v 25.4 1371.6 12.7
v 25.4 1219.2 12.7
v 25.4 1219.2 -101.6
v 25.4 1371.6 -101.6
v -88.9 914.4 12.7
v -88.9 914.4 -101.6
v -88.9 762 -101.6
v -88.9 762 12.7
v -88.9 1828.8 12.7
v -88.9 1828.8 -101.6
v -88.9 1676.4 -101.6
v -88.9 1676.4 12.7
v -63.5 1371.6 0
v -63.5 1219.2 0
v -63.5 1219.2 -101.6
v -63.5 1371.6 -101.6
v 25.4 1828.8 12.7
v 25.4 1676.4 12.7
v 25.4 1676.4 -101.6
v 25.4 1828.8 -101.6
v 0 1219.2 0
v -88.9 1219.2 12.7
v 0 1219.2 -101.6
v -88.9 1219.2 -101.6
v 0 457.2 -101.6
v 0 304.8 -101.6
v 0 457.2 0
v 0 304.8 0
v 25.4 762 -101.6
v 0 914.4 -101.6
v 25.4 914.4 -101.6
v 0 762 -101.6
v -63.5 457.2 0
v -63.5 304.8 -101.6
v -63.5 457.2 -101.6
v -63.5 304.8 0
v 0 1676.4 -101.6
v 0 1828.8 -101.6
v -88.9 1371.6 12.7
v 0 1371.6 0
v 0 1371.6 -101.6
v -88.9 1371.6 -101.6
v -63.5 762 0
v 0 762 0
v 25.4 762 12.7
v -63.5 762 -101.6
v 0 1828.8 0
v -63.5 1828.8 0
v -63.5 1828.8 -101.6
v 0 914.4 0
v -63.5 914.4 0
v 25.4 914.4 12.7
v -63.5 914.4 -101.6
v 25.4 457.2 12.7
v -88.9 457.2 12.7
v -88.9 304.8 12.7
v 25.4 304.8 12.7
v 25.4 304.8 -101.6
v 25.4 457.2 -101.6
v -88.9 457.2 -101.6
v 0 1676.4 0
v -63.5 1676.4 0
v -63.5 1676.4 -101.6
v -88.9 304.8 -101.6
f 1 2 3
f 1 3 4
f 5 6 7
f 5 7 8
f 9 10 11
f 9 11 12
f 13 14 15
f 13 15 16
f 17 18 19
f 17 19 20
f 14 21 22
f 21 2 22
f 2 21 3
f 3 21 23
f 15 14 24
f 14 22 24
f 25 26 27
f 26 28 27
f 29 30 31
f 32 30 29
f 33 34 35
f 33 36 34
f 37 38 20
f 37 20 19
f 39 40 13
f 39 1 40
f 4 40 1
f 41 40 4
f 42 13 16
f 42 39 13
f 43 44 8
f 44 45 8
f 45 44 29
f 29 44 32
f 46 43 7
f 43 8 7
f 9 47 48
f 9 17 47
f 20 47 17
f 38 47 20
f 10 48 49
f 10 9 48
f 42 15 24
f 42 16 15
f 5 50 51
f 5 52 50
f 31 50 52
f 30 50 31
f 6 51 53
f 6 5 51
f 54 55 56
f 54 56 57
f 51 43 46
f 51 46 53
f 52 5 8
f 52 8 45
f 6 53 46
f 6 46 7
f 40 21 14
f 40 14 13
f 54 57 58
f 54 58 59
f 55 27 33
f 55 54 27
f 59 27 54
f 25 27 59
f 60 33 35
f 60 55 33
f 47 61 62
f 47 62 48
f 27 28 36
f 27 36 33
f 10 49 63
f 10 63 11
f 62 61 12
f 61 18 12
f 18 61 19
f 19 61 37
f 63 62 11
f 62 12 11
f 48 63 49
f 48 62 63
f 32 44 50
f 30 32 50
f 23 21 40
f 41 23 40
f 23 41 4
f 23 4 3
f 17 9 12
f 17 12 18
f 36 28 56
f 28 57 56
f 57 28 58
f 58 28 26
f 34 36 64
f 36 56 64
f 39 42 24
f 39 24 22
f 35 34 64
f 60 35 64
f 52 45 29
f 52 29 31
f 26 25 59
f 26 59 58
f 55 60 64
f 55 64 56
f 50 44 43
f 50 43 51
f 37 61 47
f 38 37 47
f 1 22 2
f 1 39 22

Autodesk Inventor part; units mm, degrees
sketch "Sketch2" plane through (0, 0, 0) normal (1, 0, 0) x (0, 1, 0)
  line L0 (0, 0) -> (0, -1828.8)
  line L1 (0, 0) -> (2133.6, 0)
  line L2 (2133.6, 0) -> (0, -1828.8)
  line L3 (0, 0) -> (152.4, 0)
  line L4 (152.4, 0) -> (685.8, 0)
  line L5 (2133.6, 0) -> (1981.2, 0)
  line L6 (1981.2, 0) -> (1854.2, 0)
  line L7 (1854.2, 0) -> (1549.4, 0)
  line L8 (1549.4, 0) -> (1422.4, 0)
  line L9 (1422.4, 0) -> (1117.6, 0)
  line L10 (1117.6, 0) -> (990.6, 0)
  line L11 (990.6, 0) -> (685.8, 0)
  line L12 (685.8, 0) -> (558.8, 0)
  line L13 (558.8, 0) -> (254, 0)
  line L14 (0, 0) -> (304.8, 0)
  line L15 (304.8, 0) -> (457.2, 0)
  line L16 (457.2, 0) -> (762, 0)
  line L17 (762, 0) -> (914.4, 0)
  line L18 (914.4, 0) -> (1219.2, 0)
  line L19 (1219.2, 0) -> (1371.6, 0)
  line L20 (1371.6, 0) -> (1676.4, 0)
  line L21 (1676.4, 0) -> (1828.8, 0)
  line L22 (304.8, 0) -> (304.8, -101.6)
  line L23 (457.2, 0) -> (457.2, -101.6)
  line L24 (762, 0) -> (762, -101.6)
  line L25 (914.4, 0) -> (914.4, -101.6)
  line L26 (1219.2, 0) -> (1219.2, -101.6)
  line L27 (1371.6, 0) -> (1371.6, -101.6)
  line L28 (1676.4, 0) -> (1676.4, -101.6)
  line L29 (1828.8, 0) -> (1828.8, -101.6)
  line L30 (1828.8, -101.6) -> (1676.4, -101.6)
  line L31 (1371.6, -101.6) -> (1219.2, -101.6)
  line L32 (914.4, -101.6) -> (762, -101.6)
  line L33 (457.2, -101.6) -> (304.8, -101.6)
  point P0 (304.8, -1567.5429)
  point P1 (457.2, -1436.9143)
  point P2 (762, -1175.6571)
  point P3 (914.4, -1045.0286)
  point P4 (1219.2, -783.7714)
  point P5 (1371.6, -653.1429)
  point P6 (1676.4, -391.8857)
  point P7 (1828.8, -261.2571)
  dimension "d1" = 1828.8
  dimension "d3" = 152.4
  dimension "d5" = 152.4
  dimension "d14" = 304.8
  dimension "d15" = 152.4
  dimension "d16" = 304.8
  dimension "d17" = 152.4
  dimension "d18" = 304.8
  dimension "d19" = 152.4
  dimension "d20" = 304.8
  dimension "d21" = 152.4
  dimension "d24" = 2133.6
  dimension "d27" = 101.6
  dimension "d28" = 101.6
  dimension "d29" = 101.6
extrude "Extrusion1" add sketch "Sketch2" along normal blind 25.4 contours L1 L23 L33 L22 | L29 L30 L28 L1 | L1 L25 L32 L24 | L27 L31 L26 L1
ref_plane "Work Plane3" through (12.7, 914.4, 0) normal (0, 0, 1) x (1, 0, 0)
sketch "Sketch5" plane through (0, 762, 0) normal (0, 0, 1) x (1, 0, 0)
  line L0 (25.4, -304.8) -> (25.4, -457.2) projected
  line L1 (0, -304.8) -> (25.4, -304.8) projected
  line L2 (25.4, -457.2) -> (0, -457.2)
  line L3 (0, -457.2) -> (0, -304.8)
  line L4 (0, -304.8) -> (25.4, -304.8)
  line L5 (25.4, -304.8) -> (25.4, -457.2)
  line L6 (25.4, 152.4) -> (25.4, 0) projected
  line L7 (0, 152.4) -> (25.4, 152.4) projected
  line L8 (25.4, 0) -> (0, 0)
  line L9 (0, 0) -> (0, 152.4)
  line L10 (0, 152.4) -> (25.4, 152.4)
  line L11 (25.4, 152.4) -> (25.4, 0)
  line L12 (25.4, 609.6) -> (25.4, 457.2) projected
  line L13 (0, 609.6) -> (0, 457.2) projected
  line L14 (25.4, 457.2) -> (0, 457.2)
  line L15 (0, 457.2) -> (0, 609.6)
  line L16 (0, 609.6) -> (25.4, 609.6)
  line L17 (25.4, 609.6) -> (25.4, 457.2)
  line L18 (25.4, 1066.8) -> (25.4, 914.4) projected
  line L19 (0, 1066.8) -> (0, 914.4) projected
  line L20 (25.4, 914.4) -> (0, 914.4)
  line L21 (0, 914.4) -> (0, 1066.8)
  line L22 (0, 1066.8) -> (25.4, 1066.8)
  line L23 (25.4, 1066.8) -> (25.4, 914.4)
  point P0 (0, -762)
extrude "Extrusion3" add sketch "Sketch5" along normal blind 12.7
ref_plane "Work Plane5" through (0, 0, 0) normal (-1, 0, 0) x (0, 0, 1)
ref_plane "Work Plane4" through (12.7, 0, 0) normal (-1, 0, 0) x (0, 0, 1)
sketch "Sketch6" plane through (0, 0, 0) normal (-1, 0, 0) x (0, 0, 1)
  line L0 (-101.6, 304.8) -> (12.7, 304.8) projected
  line L1 (-101.6, 457.2) -> (12.7, 457.2) projected
  line L2 (12.7, 304.8) -> (0, 304.8)
  line L3 (0, 304.8) -> (0, 457.2)
  line L4 (0, 457.2) -> (12.7, 457.2)
  line L5 (12.7, 457.2) -> (12.7, 304.8)
  line L6 (-101.6, 762) -> (12.7, 762) projected
  line L7 (-101.6, 914.4) -> (12.7, 914.4) projected
  line L8 (12.7, 762) -> (0, 762)
  line L9 (0, 762) -> (0, 914.4)
  line L10 (0, 914.4) -> (12.7, 914.4)
  line L11 (12.7, 914.4) -> (12.7, 762)
  line L12 (12.7, 1371.6) -> (12.7, 1219.2) projected
  line L13 (12.7, 1219.2) -> (0, 1219.2)
  line L14 (0, 1219.2) -> (0, 1371.6)
  line L15 (0, 1371.6) -> (12.7, 1371.6)
  line L16 (12.7, 1371.6) -> (12.7, 1219.2)
  line L17 (-101.6, 1676.4) -> (12.7, 1676.4) projected
  line L18 (-101.6, 1828.8) -> (12.7, 1828.8) projected
  line L19 (12.7, 1676.4) -> (0, 1676.4)
  line L20 (0, 1676.4) -> (0, 1828.8)
  line L21 (0, 1828.8) -> (12.7, 1828.8)
  line L22 (12.7, 1828.8) -> (12.7, 1676.4)
  point P0 (0, 0)
  point P1 (0, 304.8)
  dimension "d33" = 12.7
extrude "Extrusion4" add sketch "Sketch6" along normal blind 88.9
ref_plane "Work Plane6" through (-44.45, 304.8, 0) normal (0, 0, -1) x (-1, 0, 0)
sketch "Sketch7" plane through (0, 1676.4, 0) normal (0, 0, -1) x (-1, 0, 0)
  line L0 (-25.4, -1371.6) -> (88.9, -1371.6) projected
  line L1 (-25.4, -1219.2) -> (88.9, -1219.2) projected
  line L2 (88.9, -1371.6) -> (63.5, -1371.6)
  line L3 (63.5, -1371.6) -> (63.5, -1219.2)
  line L4 (63.5, -1219.2) -> (88.9, -1219.2)
  line L5 (88.9, -1219.2) -> (88.9, -1371.6)
  line L6 (88.9, -914.4) -> (88.9, -762) projected
  line L7 (-25.4, -762) -> (88.9, -762) projected
  line L8 (88.9, -914.4) -> (63.5, -914.4)
  line L9 (63.5, -914.4) -> (63.5, -762)
  line L10 (63.5, -762) -> (88.9, -762)
  line L11 (88.9, -762) -> (88.9, -914.4)
  line L12 (-25.4, -457.2) -> (88.9, -457.2) projected
  line L13 (-25.4, -304.8) -> (88.9, -304.8) projected
  line L14 (88.9, -457.2) -> (63.5, -457.2)
  line L15 (63.5, -457.2) -> (63.5, -304.8)
  line L16 (63.5, -304.8) -> (88.9, -304.8)
  line L17 (88.9, -304.8) -> (88.9, -457.2)
  line L18 (-25.4, 0) -> (88.9, 0) projected
  line L19 (-25.4, 152.4) -> (88.9, 152.4) projected
  line L20 (88.9, 0) -> (63.5, 0)
  line L21 (63.5, 0) -> (63.5, 152.4)
  line L22 (63.5, 152.4) -> (88.9, 152.4)
  line L23 (88.9, 152.4) -> (88.9, 0)
  point P0 (0, -1676.4)
  dimension "d36" = 25.4
extrude "Extrusion5" add sketch "Sketch7" along normal blind 101.6
properties part number "BlueLights-ver-1-1111-2021"
